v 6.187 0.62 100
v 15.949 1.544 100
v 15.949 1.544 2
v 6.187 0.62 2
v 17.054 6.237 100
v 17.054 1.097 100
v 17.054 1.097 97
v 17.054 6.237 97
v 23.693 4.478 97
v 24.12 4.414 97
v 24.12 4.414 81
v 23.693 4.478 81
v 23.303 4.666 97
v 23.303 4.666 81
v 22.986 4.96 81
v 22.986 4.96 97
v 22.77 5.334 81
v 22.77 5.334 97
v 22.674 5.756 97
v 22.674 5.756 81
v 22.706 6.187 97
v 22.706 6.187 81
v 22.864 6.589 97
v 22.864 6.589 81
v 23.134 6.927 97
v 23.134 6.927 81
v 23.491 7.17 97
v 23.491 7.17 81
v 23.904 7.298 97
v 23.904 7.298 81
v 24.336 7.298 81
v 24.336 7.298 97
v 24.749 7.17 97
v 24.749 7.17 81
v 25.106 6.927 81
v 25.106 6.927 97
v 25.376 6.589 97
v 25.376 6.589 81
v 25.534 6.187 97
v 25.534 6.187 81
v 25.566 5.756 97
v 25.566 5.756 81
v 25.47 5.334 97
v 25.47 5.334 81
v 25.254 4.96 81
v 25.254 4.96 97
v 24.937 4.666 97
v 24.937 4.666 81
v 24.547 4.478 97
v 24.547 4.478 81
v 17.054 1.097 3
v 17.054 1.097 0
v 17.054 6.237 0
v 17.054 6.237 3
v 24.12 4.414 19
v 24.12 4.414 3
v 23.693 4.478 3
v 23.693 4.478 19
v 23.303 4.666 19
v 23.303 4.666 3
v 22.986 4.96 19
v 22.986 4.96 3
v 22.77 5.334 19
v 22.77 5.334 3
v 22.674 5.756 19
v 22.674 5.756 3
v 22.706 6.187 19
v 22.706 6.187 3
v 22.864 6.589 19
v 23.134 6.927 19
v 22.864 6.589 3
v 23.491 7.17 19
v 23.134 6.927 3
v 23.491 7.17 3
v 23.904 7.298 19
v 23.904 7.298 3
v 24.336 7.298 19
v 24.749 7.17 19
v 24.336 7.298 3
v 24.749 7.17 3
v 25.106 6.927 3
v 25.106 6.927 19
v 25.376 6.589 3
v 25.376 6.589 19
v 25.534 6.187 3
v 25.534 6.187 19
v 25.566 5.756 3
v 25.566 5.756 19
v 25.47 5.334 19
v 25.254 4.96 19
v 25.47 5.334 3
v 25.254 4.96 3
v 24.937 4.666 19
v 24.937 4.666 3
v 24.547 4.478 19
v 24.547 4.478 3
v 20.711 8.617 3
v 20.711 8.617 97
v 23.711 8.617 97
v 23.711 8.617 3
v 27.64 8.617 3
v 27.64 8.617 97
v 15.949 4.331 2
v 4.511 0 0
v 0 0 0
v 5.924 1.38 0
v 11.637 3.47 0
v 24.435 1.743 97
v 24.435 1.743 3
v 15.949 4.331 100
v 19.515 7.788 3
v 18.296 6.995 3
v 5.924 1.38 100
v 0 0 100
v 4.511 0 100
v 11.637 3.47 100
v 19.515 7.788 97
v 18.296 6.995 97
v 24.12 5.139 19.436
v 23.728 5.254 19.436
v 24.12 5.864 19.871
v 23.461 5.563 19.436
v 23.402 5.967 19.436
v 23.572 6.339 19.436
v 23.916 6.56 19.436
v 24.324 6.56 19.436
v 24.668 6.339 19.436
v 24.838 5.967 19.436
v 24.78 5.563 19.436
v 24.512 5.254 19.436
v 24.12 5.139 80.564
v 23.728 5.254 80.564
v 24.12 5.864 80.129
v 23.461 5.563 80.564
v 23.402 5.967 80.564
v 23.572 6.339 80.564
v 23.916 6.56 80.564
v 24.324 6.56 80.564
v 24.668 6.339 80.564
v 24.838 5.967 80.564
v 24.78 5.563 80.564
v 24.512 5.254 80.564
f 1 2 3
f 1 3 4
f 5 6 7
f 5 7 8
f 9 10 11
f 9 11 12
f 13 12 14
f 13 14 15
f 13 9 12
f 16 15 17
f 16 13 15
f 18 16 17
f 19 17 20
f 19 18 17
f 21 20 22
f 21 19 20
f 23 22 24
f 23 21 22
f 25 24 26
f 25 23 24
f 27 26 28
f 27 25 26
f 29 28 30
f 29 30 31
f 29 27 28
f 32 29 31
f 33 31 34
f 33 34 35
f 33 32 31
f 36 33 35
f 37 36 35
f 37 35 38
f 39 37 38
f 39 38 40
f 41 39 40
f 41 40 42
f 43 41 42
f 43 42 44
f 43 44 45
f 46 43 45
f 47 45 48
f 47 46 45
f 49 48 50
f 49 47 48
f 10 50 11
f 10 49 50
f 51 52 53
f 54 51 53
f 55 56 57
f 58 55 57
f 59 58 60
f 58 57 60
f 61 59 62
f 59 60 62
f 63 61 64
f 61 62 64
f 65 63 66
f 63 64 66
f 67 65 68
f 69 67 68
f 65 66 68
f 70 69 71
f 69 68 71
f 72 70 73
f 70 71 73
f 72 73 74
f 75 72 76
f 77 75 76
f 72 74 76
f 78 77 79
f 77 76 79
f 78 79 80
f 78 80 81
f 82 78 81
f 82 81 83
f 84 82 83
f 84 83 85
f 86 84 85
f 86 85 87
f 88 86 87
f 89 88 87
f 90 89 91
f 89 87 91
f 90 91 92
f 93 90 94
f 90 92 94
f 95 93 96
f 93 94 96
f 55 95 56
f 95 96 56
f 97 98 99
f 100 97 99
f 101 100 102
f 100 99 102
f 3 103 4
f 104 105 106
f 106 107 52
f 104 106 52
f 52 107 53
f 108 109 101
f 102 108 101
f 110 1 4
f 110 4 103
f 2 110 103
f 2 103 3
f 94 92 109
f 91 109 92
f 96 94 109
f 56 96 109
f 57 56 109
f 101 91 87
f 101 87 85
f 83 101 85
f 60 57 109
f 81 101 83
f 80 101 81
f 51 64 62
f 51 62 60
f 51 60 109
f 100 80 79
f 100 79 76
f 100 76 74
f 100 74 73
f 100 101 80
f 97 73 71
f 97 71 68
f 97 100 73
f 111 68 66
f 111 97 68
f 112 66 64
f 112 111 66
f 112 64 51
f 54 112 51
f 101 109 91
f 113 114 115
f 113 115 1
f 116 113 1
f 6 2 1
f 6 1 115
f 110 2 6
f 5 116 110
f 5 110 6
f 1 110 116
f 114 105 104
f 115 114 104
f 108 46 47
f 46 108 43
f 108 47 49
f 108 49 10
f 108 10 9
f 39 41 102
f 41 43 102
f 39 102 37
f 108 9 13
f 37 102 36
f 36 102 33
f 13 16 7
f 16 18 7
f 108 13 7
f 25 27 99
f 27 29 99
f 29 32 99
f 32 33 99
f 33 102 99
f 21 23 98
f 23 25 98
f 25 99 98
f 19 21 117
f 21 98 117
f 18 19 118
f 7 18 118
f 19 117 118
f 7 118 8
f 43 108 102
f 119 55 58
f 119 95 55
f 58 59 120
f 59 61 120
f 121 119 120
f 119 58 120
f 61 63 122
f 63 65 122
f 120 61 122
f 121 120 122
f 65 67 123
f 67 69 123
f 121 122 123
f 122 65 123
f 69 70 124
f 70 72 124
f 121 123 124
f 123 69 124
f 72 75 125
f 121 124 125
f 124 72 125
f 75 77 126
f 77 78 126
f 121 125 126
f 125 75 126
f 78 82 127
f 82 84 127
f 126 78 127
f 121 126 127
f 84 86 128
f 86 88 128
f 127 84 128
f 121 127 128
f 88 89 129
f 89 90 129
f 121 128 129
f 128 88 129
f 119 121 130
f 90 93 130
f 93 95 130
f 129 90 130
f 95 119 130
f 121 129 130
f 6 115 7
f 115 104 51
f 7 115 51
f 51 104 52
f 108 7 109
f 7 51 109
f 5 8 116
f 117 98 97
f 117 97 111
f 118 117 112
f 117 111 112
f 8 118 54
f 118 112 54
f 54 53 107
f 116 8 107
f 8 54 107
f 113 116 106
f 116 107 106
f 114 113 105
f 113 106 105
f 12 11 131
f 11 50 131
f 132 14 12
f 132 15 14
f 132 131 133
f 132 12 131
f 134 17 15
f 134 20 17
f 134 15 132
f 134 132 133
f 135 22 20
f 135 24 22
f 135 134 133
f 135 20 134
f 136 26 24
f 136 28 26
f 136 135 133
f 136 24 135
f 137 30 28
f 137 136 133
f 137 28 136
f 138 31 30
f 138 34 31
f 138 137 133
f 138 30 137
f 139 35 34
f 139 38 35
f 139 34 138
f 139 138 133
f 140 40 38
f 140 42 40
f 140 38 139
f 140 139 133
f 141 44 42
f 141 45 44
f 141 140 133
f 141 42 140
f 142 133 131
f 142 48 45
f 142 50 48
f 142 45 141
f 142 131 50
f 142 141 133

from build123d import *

# Parameters (mm, degrees)
EXTRUDE1_DEPTH     = 100
EXTRUDE5_DEPTH     = 3
SKETCH17_W         = 35
SKETCH17_H         = 13.283913387
CUT_EXTRUDE1_DEPTH = 100
SKETCH19_W         = 24.898249574
SKETCH19_H         = 2.5
CUT_EXTRUDE2_DEPTH = 100
CUT_EXTRUDE3_DEPTH = 98
SKETCH21_W         = 6.656858378
SKETCH21_H         = 5.544933951
CUT_EXTRUDE5_DEPTH = 3
SKETCH23_W         = 11.264163756
SKETCH23_H         = 3.071962193
CUT_EXTRUDE6_DEPTH = 3
SKETCH24_W         = 6.656858378
SKETCH24_H         = 5.544933951
CUT_EXTRUDE7_DEPTH = 3
SKETCH25_W         = 8.129030682
SKETCH25_H         = 5.409731787
CUT_EXTRUDE8_DEPTH = 3


with BuildPart() as part:
    # Sketch1 → Extrude1 (new body)
    with BuildSketch(Plane.XY):
        with BuildLine():
            Line((24.434543456, 1.743114855), (35, 24.400809531))
            ThreePointArc((35, 24.400809531), (20.23335986, 8.279731765), (0, 0))
            Line((0, 0), (4.510649495, 0))
            Line((4.510649495, 0), (24.434543456, 1.743114855))
        make_face()
    extrude(amount=EXTRUDE1_DEPTH)

    # Sketch10 → Extrude5 (cut)
    with BuildSketch(Plane.XY.offset(100)):
        Polygon((27.084425545, 11.426798952), (29.084425545, 11.066694717), (24.434543456, 1.743114855), (17.054195147, 3.071962193), align=None)
    extrude5 = extrude(amount=-EXTRUDE5_DEPTH, mode=Mode.SUBTRACT)

    # Mirror2: Extrude5 across plane
    add(extrude5.mirror(Plane.XY.offset(50)), mode=Mode.SUBTRACT)

    # Sketch16 → M2.5 Clearance Hole2 (revolve, cut)
    with BuildSketch(Plane(origin=(24.120076457, 5.864055695, 97), x_dir=(0, -1, 0), z_dir=(1, 0, 0))):
        Polygon((0, 0), (0, 16.871247898), (1.45, 16), (1.45, 0), align=None)
    m2_5_clearance_hole2 = revolve(axis=Axis((24.120076457, 5.864055695, 103.35), (0, 0, -1)), mode=Mode.SUBTRACT)

    # Mirror3: M2.5 Clearance Hole2 across plane
    add(m2_5_clearance_hole2.mirror(Plane.XY.offset(50)), mode=Mode.SUBTRACT)

    # Sketch17 → Cut-Extrude1 (cut)
    with BuildSketch(Plane.XY.offset(100)):
        with Locations((17.5, 17.758852838)):
            Rectangle(SKETCH17_W, SKETCH17_H)
    extrude(amount=-CUT_EXTRUDE1_DEPTH, mode=Mode.SUBTRACT)

    # Sketch19 → Cut-Extrude2 (cut)
    with BuildSketch(Plane.XY.offset(100)):
        with Locations((16.356484671, 9.866896144)):
            Rectangle(SKETCH19_W, SKETCH19_H)
    extrude(amount=-CUT_EXTRUDE2_DEPTH, mode=Mode.SUBTRACT)

    # Sketch20 → Cut-Extrude3 (cut)
    with BuildSketch(Plane.XY.offset(100)):
        Polygon((6.18702488, 0.620277991), (15.948528927, 4.330532923), (15.948528927, 1.543663509), align=None)
    extrude(amount=-CUT_EXTRUDE3_DEPTH, mode=Mode.SUBTRACT)

    # Sketch21 → Cut-Extrude5 (cut)
    with BuildSketch(Plane.XY.offset(100)):
        with Locations((20.382624336, 5.844429168)):
            Rectangle(SKETCH21_W, SKETCH21_H)
    extrude(amount=-CUT_EXTRUDE5_DEPTH, mode=Mode.SUBTRACT)

    # Sketch23 → Cut-Extrude6 (cut)
    with BuildSketch(Plane.XY.offset(100)):
        with Locations((22.686277025, 1.535981097)):
            Rectangle(SKETCH23_W, SKETCH23_H)
    extrude(amount=-CUT_EXTRUDE6_DEPTH, mode=Mode.SUBTRACT)

    # Sketch24 → Cut-Extrude7 (cut)
    with BuildSketch(Plane(origin=(0, 0, 0), x_dir=(-1, 0, 0), z_dir=(0, 0, -1))):
        with Locations((-20.382624336, 5.844429168)):
            Rectangle(SKETCH24_W, SKETCH24_H)
    extrude(amount=-CUT_EXTRUDE7_DEPTH, mode=Mode.SUBTRACT)

    # Sketch25 → Cut-Extrude8 (cut)
    with BuildSketch(Plane(origin=(0, 0, 0), x_dir=(-1, 0, 0), z_dir=(0, 0, -1))):
        with Locations((-21.118710488, 0.3670963)):
            Rectangle(SKETCH25_W, SKETCH25_H)
    extrude(amount=-CUT_EXTRUDE8_DEPTH, mode=Mode.SUBTRACT)


solid = part.part
